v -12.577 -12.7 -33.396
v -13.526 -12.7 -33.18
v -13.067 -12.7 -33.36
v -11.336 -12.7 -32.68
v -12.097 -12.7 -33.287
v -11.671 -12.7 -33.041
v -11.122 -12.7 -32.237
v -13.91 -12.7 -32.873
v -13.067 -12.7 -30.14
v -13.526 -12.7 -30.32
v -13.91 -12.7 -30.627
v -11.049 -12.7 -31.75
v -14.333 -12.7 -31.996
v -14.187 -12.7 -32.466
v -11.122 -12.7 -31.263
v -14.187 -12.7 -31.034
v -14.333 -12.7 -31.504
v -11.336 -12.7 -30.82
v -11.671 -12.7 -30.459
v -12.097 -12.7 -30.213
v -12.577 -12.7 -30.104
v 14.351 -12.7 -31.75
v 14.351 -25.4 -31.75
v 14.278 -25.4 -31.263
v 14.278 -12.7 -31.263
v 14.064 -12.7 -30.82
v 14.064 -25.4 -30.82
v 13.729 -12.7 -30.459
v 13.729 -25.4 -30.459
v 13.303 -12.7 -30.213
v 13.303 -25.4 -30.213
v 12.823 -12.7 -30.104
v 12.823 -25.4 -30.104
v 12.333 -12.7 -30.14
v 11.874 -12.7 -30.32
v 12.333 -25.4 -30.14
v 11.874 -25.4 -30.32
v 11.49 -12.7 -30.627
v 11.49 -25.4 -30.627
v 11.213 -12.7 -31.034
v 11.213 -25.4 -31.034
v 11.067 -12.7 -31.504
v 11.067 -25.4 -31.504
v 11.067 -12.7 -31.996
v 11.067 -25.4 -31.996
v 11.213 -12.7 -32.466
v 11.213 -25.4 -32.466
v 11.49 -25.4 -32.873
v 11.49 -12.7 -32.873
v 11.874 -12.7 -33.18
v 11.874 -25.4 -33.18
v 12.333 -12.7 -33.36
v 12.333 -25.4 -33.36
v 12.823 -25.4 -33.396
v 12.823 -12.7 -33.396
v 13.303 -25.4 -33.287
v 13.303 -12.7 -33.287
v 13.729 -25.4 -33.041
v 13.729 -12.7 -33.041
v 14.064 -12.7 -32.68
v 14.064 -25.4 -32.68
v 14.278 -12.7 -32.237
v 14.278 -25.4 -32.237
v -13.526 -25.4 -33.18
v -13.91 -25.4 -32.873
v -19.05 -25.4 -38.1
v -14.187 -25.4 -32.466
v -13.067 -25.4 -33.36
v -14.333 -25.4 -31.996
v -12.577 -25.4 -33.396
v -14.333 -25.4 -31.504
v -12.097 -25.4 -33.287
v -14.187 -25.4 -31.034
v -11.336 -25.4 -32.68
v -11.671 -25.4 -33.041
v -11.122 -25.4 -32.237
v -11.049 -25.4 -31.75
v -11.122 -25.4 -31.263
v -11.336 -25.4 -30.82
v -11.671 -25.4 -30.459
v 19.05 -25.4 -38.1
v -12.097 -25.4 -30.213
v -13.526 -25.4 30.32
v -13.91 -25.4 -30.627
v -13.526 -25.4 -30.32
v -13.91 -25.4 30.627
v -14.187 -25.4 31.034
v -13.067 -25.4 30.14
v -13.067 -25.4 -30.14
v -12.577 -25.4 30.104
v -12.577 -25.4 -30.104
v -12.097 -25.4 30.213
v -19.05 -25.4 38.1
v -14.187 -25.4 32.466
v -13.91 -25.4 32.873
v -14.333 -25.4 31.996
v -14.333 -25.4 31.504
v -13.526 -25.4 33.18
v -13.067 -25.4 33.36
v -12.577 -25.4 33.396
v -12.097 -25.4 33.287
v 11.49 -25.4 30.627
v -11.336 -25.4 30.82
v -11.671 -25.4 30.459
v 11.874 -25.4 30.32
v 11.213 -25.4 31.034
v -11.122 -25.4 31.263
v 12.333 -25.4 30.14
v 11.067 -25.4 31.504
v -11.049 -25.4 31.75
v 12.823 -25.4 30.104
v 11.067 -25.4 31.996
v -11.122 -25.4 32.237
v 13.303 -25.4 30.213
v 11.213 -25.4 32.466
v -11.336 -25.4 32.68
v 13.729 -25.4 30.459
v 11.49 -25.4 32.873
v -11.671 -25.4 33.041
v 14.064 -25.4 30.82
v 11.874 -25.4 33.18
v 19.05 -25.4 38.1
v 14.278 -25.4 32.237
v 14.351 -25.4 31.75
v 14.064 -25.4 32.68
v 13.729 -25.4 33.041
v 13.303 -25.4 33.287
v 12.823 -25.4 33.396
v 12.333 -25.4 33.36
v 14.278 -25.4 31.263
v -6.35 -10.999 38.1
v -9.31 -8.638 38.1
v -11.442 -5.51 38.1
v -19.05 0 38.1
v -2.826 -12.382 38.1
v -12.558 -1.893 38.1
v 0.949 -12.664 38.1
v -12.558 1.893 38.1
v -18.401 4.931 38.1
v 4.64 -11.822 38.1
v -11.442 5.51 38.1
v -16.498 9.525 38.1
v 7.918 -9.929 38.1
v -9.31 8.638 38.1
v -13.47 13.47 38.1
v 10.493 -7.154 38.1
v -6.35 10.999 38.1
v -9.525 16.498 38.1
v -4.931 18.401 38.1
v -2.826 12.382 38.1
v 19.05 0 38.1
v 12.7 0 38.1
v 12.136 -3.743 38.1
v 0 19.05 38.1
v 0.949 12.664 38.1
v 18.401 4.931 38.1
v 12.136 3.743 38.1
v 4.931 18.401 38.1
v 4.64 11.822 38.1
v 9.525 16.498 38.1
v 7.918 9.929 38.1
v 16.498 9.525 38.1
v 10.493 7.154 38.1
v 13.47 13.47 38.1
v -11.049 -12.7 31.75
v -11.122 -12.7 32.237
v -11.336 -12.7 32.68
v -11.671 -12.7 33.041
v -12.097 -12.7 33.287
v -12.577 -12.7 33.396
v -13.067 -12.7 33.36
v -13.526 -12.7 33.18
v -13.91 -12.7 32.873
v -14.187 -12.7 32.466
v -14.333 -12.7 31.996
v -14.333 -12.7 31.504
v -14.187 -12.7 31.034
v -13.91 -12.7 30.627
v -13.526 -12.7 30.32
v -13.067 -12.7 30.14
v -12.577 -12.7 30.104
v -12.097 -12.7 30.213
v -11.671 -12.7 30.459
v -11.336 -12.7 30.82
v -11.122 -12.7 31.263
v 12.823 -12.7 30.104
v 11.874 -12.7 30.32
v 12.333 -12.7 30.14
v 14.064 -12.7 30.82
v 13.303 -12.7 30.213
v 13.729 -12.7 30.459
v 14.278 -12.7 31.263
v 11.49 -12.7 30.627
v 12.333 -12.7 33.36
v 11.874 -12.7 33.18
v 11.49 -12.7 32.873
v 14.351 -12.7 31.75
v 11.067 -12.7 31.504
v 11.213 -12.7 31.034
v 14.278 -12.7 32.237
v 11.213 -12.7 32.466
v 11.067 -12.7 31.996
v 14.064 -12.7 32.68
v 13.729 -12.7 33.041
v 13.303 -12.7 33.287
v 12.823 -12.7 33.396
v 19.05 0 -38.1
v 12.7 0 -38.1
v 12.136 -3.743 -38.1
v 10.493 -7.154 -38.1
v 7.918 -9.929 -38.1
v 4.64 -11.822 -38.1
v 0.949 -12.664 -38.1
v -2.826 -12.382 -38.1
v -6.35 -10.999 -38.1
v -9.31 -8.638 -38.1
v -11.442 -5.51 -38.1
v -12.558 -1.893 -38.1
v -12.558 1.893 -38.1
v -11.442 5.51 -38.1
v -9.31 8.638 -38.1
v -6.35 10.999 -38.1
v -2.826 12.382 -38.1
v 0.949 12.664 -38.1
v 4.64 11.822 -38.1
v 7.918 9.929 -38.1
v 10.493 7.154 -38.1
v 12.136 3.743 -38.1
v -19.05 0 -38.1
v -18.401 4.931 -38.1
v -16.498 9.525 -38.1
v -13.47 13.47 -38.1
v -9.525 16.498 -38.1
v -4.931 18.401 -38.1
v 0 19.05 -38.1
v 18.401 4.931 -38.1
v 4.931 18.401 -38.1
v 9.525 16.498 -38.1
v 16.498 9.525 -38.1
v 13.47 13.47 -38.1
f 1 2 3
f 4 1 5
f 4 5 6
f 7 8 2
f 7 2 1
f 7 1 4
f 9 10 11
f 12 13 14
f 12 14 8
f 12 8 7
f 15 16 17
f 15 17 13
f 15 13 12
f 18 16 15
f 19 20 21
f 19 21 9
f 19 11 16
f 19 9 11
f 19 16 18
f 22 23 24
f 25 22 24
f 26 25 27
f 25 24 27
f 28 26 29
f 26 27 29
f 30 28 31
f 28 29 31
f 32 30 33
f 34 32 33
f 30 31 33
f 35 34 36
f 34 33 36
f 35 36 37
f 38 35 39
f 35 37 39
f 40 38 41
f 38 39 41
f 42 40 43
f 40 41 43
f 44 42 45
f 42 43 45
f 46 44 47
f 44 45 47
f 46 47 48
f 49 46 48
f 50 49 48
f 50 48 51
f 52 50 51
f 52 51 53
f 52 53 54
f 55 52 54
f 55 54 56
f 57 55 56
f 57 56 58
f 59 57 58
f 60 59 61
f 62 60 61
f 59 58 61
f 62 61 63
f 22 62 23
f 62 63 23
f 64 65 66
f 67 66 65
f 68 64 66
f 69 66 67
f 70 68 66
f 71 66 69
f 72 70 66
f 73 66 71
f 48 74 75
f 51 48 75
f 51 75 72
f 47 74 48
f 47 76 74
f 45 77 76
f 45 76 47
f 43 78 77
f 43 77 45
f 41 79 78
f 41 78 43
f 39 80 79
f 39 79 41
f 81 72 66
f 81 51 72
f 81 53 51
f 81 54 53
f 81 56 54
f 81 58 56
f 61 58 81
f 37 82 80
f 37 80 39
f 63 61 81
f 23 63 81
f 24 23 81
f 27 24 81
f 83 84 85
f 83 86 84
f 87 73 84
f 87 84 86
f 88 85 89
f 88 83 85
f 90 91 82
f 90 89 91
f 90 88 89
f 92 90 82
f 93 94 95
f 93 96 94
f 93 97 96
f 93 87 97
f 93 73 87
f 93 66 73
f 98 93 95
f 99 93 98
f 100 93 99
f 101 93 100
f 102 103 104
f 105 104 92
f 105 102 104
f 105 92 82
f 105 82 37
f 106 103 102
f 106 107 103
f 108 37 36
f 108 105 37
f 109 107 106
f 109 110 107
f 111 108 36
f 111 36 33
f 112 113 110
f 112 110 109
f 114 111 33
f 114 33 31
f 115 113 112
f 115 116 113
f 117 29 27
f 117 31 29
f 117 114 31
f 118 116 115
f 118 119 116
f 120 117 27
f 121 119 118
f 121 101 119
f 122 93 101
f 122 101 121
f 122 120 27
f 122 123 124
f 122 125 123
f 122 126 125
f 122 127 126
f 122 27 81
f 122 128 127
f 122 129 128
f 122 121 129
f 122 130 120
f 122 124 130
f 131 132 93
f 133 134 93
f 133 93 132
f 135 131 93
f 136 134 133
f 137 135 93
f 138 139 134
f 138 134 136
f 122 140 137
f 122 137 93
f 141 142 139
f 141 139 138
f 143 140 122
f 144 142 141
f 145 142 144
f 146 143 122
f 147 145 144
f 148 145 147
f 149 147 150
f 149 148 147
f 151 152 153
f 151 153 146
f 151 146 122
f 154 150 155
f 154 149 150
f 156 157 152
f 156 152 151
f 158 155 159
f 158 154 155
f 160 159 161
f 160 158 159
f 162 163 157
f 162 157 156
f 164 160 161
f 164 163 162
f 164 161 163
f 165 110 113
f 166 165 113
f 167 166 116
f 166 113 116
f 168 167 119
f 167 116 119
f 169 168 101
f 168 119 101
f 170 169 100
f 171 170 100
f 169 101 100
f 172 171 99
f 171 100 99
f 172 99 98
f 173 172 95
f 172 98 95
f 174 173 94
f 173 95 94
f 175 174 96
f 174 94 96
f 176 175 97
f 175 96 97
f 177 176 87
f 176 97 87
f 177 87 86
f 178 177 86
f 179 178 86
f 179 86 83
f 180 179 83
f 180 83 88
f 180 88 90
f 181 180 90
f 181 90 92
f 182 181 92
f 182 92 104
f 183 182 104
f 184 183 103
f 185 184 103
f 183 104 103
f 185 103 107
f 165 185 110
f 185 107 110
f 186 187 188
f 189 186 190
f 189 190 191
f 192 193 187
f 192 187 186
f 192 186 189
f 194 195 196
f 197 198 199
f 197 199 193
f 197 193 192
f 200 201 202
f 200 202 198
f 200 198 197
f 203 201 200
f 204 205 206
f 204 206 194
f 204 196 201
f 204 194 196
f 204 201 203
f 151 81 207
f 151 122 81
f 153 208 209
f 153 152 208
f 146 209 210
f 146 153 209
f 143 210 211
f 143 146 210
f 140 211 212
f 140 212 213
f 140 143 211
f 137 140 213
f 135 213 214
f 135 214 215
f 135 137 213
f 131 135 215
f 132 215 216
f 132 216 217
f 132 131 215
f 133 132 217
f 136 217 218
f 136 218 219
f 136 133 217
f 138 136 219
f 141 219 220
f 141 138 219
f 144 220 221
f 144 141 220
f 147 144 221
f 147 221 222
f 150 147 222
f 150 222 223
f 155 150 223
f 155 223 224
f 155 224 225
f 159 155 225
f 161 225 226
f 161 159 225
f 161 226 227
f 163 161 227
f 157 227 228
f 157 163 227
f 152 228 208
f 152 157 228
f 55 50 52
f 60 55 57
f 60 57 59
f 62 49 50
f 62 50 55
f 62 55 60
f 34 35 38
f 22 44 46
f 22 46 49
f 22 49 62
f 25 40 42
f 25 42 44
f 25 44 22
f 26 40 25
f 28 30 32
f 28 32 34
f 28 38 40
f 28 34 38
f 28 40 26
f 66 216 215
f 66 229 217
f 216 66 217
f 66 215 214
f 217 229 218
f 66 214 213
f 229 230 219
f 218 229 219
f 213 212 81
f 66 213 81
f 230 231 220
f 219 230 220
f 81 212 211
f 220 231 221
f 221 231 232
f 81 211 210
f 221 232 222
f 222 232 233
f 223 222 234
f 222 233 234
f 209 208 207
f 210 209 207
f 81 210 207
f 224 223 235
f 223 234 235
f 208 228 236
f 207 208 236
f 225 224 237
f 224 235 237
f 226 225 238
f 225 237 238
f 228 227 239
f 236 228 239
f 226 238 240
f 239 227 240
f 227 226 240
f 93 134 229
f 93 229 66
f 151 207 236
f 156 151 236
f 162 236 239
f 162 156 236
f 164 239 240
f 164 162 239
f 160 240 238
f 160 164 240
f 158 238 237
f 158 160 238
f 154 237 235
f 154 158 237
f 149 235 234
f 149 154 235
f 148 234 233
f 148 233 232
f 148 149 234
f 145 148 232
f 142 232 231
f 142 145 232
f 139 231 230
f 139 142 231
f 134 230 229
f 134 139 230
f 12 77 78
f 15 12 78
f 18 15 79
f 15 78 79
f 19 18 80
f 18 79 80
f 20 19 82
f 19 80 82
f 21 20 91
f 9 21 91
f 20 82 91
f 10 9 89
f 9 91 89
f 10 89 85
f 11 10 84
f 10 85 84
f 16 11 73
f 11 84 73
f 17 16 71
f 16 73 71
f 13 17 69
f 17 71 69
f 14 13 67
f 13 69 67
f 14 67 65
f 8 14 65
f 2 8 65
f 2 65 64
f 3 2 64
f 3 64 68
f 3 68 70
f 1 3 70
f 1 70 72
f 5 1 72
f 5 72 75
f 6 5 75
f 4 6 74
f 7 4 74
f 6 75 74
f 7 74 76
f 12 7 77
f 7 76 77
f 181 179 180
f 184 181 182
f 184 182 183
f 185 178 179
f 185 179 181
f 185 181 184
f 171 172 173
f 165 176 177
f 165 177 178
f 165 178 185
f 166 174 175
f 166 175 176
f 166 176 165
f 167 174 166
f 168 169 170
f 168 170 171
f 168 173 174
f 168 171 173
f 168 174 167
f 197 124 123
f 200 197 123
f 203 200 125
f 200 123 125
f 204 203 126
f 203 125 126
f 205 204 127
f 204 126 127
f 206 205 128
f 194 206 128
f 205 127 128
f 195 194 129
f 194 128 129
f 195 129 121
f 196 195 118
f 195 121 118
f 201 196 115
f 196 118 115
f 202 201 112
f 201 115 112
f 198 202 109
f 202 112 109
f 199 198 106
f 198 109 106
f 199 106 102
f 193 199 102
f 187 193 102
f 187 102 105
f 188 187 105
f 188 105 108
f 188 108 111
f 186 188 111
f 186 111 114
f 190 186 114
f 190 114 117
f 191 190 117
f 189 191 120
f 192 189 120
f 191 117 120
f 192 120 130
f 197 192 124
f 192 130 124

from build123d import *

# Parameters (mm, degrees)
F1_DEPTH = 38.1
F2_R     = 1.651
F3_DEPTH = 12.7


with BuildPart() as f1:
    # F0 (on Top) → F1 (new body, symmetric)
    with BuildSketch(Plane.XY):
        with BuildLine():
            Line((12.7, 0), (19.05, 0))
            ThreePointArc((19.05, 0), (0, 19.05), (-19.05, 0))
            Line((-19.05, 0), (-12.7, 0))
            ThreePointArc((-12.7, 0), (0, 12.7), (12.7, 0))
        make_face()
        with BuildLine():
            Line((19.05, -25.4), (19.05, 0))
            ThreePointArc((19.05, 0), (0, -19.05), (-19.05, 0))
            Line((-19.05, 0), (-19.05, -25.4))
            Line((-19.05, -25.4), (19.05, -25.4))
        make_face()
        with BuildLine():
            ThreePointArc((-19.05, 0), (0, -19.05), (19.05, 0))
            Line((19.05, 0), (12.7, 0))
            ThreePointArc((12.7, 0), (0, -12.7), (-12.7, 0))
            Line((-12.7, 0), (-19.05, 0))
        make_face()
    extrude(amount=F1_DEPTH, both=True)

    # F2 (on face) → F3 (cut)
    with BuildSketch(Plane.XZ.offset(25.4)):
        with Locations((12.7, 31.75)):
            Circle(F2_R)
        with Locations((-12.7, 31.75)):
            Circle(F2_R)
        with Locations((-12.7, -31.75)):
            Circle(F2_R)
        with Locations((12.7, -31.75)):
            Circle(F2_R)
    extrude(amount=-F3_DEPTH, mode=Mode.SUBTRACT)


solid = f1.part
